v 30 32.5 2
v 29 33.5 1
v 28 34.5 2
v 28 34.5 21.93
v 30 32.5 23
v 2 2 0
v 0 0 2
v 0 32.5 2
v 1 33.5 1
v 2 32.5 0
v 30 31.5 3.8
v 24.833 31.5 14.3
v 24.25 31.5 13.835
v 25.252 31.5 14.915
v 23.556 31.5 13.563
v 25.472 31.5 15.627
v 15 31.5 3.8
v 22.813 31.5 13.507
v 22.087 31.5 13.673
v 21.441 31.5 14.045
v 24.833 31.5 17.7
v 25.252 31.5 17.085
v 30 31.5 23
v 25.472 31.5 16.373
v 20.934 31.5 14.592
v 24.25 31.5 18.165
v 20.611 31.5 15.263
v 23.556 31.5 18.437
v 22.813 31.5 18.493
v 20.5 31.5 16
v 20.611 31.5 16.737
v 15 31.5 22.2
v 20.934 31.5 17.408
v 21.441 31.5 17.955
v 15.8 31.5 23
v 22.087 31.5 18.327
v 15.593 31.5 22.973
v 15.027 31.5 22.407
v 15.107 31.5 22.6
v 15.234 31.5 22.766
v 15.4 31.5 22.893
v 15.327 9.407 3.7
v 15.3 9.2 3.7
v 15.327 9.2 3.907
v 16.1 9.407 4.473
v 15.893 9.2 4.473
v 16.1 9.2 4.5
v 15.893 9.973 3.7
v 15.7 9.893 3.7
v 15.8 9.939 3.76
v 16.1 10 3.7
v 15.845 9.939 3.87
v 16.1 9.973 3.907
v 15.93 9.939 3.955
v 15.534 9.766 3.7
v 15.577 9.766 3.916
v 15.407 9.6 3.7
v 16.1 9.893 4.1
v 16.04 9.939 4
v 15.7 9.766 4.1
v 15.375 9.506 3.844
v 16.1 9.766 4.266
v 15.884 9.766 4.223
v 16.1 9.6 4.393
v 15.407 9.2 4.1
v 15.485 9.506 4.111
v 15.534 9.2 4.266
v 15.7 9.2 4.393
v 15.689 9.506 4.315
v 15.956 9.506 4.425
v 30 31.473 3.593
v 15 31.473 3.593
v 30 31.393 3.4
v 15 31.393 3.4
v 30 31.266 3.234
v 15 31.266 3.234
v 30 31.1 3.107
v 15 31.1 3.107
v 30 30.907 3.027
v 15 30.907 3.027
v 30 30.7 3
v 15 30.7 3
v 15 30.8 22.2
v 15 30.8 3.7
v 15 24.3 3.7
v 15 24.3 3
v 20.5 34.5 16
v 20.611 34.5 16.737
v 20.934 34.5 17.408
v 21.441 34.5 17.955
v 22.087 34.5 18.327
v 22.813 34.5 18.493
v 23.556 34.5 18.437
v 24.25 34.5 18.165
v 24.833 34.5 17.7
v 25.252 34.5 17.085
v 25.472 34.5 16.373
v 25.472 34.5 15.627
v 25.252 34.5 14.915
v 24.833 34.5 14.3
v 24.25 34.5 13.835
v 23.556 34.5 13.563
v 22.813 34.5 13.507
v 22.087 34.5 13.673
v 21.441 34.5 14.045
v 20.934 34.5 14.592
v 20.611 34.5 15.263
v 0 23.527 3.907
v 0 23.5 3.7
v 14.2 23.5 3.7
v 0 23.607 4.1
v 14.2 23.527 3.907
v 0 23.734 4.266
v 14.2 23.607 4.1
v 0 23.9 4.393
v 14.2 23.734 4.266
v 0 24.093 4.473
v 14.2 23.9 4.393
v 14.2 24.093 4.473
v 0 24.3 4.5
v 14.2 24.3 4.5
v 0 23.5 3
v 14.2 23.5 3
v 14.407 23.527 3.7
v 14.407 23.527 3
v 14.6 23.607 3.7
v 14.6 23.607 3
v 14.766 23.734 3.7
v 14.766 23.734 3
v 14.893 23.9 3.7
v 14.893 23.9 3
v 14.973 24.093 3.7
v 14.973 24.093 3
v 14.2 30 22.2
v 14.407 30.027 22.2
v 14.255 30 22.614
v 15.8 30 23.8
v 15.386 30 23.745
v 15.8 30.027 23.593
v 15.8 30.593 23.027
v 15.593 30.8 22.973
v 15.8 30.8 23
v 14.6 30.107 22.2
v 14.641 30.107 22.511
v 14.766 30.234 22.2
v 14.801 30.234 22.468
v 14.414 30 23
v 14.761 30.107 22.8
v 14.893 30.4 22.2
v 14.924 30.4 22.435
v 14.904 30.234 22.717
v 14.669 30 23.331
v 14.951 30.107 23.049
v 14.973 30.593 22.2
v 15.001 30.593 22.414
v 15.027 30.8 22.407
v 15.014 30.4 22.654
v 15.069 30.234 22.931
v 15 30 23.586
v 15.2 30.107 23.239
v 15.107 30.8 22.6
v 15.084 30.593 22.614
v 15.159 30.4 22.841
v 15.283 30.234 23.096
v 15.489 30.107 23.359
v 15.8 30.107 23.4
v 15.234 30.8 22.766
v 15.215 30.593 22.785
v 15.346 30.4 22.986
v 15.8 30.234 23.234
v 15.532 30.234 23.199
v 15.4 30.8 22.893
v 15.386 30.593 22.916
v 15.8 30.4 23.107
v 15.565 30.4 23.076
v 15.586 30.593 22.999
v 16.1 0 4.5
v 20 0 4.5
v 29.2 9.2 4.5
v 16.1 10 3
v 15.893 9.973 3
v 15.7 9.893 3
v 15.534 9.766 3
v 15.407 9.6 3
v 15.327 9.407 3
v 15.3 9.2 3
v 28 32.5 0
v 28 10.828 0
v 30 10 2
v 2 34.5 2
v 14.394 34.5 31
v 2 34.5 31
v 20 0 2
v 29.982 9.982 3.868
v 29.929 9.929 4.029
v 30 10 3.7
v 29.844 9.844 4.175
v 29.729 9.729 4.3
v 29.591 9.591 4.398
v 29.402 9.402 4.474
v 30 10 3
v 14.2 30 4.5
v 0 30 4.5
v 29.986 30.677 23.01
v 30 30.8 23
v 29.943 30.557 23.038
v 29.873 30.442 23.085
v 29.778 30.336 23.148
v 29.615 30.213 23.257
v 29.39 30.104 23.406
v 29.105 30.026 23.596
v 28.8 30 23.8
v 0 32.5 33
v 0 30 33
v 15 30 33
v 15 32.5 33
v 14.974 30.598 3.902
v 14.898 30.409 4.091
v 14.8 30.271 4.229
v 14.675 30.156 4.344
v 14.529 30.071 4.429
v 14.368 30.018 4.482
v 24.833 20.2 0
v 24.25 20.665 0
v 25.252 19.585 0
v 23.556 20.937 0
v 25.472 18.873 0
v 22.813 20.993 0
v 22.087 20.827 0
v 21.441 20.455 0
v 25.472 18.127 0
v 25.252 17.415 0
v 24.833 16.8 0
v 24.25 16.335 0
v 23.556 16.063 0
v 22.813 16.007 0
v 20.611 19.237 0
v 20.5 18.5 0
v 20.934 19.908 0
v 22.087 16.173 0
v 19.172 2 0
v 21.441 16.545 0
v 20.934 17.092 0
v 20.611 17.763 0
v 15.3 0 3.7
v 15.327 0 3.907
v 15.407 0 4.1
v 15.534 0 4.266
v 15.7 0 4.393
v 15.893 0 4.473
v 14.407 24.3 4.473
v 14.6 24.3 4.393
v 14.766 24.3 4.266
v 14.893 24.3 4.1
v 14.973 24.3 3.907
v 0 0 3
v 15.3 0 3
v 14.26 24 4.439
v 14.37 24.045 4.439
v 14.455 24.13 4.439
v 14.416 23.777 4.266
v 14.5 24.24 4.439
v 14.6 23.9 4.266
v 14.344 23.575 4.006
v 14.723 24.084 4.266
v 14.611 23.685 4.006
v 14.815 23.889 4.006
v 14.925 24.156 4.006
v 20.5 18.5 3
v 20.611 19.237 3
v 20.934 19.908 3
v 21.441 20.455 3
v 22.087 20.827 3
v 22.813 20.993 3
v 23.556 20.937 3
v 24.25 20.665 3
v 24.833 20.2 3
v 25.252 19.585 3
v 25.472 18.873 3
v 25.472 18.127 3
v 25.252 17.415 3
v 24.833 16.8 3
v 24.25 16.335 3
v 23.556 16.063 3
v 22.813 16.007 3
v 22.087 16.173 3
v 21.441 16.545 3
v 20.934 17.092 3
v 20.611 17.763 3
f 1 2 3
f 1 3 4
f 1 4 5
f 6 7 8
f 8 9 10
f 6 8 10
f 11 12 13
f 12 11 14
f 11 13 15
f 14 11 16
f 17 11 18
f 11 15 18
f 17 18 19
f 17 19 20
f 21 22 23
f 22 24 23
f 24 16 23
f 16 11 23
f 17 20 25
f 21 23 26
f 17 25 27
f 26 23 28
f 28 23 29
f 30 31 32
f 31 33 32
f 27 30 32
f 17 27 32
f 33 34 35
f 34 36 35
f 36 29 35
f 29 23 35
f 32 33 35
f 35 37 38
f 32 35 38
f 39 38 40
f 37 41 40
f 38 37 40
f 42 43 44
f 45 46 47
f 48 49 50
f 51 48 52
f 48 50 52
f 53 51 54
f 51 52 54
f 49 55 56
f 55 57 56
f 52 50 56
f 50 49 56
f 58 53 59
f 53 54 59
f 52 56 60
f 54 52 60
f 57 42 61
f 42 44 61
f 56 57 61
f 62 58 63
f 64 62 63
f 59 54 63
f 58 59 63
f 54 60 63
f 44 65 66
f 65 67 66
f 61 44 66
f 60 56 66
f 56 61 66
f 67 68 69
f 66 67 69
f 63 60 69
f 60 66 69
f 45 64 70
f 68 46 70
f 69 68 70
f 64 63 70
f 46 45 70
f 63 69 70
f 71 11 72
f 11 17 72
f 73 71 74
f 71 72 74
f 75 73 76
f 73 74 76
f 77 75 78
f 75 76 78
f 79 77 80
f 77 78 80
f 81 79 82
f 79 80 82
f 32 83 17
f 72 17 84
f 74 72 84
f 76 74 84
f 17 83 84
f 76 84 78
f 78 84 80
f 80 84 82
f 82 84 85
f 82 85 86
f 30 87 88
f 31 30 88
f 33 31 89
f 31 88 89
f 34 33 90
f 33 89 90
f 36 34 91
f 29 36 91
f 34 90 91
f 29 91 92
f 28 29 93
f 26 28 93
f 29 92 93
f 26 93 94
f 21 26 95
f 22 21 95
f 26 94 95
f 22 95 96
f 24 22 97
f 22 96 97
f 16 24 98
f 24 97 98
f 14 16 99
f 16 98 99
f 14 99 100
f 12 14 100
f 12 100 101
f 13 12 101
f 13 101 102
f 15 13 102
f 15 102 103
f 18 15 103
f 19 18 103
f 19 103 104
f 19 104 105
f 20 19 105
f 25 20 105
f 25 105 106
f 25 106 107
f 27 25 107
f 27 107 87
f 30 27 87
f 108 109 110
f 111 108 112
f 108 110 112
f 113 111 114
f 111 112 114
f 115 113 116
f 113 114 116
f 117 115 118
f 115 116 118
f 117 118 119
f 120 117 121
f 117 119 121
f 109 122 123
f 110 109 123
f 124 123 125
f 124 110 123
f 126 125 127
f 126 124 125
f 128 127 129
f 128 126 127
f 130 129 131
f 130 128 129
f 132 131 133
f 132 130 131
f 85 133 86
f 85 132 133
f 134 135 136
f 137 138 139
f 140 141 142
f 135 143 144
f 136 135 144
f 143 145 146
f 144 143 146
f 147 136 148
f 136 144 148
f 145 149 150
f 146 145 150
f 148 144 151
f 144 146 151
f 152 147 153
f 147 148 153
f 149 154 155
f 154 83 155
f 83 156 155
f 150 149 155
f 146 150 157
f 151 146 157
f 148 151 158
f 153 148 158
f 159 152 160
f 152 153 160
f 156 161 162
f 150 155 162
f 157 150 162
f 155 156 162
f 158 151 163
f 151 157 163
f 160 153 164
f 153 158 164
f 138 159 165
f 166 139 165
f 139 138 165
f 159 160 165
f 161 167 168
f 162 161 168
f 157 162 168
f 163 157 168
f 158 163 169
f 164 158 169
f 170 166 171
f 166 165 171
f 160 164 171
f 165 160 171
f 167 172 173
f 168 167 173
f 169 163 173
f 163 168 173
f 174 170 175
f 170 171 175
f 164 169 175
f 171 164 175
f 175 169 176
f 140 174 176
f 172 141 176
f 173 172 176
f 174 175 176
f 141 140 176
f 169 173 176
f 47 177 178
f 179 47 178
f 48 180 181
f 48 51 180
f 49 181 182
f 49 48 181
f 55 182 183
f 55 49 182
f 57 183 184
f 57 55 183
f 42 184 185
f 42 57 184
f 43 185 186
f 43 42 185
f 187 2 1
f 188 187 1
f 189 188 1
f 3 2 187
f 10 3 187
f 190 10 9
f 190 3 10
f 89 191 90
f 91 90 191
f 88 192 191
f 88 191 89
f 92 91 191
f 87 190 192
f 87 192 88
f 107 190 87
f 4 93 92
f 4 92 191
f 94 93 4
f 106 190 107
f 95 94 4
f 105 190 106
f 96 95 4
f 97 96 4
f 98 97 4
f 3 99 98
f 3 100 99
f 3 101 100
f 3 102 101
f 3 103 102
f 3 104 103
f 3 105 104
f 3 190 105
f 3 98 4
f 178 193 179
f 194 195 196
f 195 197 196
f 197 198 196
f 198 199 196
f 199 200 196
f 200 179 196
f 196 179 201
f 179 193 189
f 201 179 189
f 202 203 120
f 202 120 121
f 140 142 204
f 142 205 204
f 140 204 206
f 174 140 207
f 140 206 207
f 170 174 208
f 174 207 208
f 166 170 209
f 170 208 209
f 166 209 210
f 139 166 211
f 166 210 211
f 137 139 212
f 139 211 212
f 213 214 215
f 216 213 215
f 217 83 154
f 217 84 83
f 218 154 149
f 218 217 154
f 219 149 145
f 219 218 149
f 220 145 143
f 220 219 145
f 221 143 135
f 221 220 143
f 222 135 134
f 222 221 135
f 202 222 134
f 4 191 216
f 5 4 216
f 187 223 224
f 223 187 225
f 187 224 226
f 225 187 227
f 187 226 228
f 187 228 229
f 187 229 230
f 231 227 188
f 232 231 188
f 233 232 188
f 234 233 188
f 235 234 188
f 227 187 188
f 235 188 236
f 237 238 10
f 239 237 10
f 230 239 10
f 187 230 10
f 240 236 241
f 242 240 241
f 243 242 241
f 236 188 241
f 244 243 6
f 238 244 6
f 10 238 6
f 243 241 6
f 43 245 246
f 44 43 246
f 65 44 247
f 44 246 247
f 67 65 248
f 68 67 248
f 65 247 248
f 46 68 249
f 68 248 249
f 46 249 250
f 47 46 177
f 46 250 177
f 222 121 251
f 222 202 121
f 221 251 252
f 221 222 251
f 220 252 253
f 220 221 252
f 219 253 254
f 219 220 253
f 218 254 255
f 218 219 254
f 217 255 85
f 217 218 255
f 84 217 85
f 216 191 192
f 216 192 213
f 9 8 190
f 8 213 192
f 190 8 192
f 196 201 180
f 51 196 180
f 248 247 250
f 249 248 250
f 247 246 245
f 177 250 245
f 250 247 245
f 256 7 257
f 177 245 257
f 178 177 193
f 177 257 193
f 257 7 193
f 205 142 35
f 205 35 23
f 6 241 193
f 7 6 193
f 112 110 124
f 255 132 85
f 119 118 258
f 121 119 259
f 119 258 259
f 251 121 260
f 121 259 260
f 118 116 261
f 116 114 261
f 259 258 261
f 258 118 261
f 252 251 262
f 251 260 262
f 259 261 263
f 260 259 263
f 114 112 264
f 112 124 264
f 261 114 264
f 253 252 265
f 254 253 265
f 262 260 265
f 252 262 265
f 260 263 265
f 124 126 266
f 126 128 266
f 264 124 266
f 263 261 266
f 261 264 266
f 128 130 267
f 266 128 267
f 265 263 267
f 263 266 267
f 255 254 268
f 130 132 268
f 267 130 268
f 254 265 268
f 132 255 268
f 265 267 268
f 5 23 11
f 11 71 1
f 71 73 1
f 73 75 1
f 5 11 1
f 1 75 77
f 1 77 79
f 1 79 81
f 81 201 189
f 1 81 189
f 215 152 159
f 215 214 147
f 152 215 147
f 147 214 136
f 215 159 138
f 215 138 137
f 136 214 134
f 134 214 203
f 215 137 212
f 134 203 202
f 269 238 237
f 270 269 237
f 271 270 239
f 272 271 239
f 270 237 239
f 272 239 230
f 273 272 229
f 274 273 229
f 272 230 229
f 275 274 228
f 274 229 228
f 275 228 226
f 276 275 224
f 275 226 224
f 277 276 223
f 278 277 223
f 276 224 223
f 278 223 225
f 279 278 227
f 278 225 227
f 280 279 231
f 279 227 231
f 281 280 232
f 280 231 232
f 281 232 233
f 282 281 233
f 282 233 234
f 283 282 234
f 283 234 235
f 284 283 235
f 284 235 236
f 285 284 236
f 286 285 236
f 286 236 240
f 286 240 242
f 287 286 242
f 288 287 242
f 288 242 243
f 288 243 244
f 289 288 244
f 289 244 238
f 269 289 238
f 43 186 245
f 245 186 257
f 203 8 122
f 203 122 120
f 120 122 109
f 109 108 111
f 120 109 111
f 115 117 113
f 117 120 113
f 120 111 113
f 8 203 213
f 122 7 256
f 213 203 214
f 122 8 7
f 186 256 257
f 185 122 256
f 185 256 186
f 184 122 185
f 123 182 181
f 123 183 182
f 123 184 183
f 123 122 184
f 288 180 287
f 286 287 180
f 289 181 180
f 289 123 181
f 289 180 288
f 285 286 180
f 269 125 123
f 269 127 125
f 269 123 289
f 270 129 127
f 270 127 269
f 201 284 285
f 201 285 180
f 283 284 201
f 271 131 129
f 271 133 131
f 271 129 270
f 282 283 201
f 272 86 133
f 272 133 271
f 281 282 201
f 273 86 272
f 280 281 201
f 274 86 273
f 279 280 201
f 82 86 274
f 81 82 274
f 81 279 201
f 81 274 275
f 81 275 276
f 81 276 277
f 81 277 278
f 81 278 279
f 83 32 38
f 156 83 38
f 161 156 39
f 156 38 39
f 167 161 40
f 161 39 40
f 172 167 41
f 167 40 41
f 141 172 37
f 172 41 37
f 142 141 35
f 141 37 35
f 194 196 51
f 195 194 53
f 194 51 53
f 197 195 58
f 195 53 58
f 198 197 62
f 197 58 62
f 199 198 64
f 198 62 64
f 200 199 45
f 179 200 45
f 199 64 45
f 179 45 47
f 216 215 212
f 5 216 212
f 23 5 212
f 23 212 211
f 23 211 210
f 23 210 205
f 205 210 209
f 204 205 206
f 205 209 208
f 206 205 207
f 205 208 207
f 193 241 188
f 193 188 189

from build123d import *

# Parameters (mm, degrees)
BOSS_EXTRUDE1_DEPTH = 3
SKETCH2_W           = 15
SKETCH2_H           = 6.5
BOSS_EXTRUDE2_DEPTH = 1.5
BOSS_EXTRUDE3_DEPTH = 4.5
CUT_EXTRUDE1_DEPTH  = 1.5
FILLET1_R           = 0.8
CHAMFER1_SIZE       = 2
CHAMFER2_SIZE       = 2
FILLET2_R           = 0.8
SKETCH5_R           = 2.5
CUT_EXTRUDE2_DEPTH  = 57.384838388
SKETCH6_R           = 2.5
CUT_EXTRUDE3_DEPTH  = 57.384838388


with BuildPart() as part:
    # Sketch1 → Boss-Extrude1 (new body)
    with BuildSketch(Plane.XY):
        Polygon((0, 0), (20, 0), (30, 10), (30, 30), (0, 30), align=None)
    extrude(amount=BOSS_EXTRUDE1_DEPTH)

    # Sketch2 → Boss-Extrude2 (add)
    with BuildSketch(Plane.XY.offset(3)):
        Polygon((30, 10), (15.3, 10), (15.3, 0), (20, 0), align=None)
        with Locations((7.5, 26.75)):
            Rectangle(SKETCH2_W, SKETCH2_H)
    extrude(amount=BOSS_EXTRUDE2_DEPTH)

    # Sketch3 → Boss-Extrude3 (add)
    with BuildSketch(Plane(origin=(0, 30, 0), x_dir=(1, 0, 0), z_dir=(0, 1, 0))):
        Polygon((0, -3), (0, -33), (15, -33), (30, -23), (30, -3), (30, 0), (0, 0), align=None)
    extrude(amount=BOSS_EXTRUDE3_DEPTH)

    # Sketch4 → Cut-Extrude1 (cut)
    with BuildSketch(Plane.XZ.offset(-30)):
        Polygon((15, 23), (30, 23), (30, 3), (15, 3), (15, 4.5), align=None)
    extrude(amount=-CUT_EXTRUDE1_DEPTH, mode=Mode.SUBTRACT)

    # Fillet1
    fillet1_edges = [part.edges().sort_by_distance(p)[0] for p in [
        (15, 23.5, 3.75),
        (7.5, 23.5, 4.5),
        (15, 26.75, 4.5),
        (15.3, 5, 4.5),
        (15.3, 10, 3.75),
        (22.65, 10, 4.5),
        (15, 30, 13.75),
        (22.5, 30, 23),
        (15, 30.75, 23),
    ]]
    fillet(fillet1_edges, radius=FILLET1_R)

    # Chamfer1
    chamfer1_edges = [part.edges().sort_by_distance(p)[0] for p in [
        (15, 34.5, 0),
    ]]
    chamfer(chamfer1_edges, length=CHAMFER1_SIZE)

    # Chamfer2
    # the kernel refuses this chamfer: 2 mm, written as the material it takes off along each edge
    with BuildSketch(Plane(origin=(30, 37.643365976, 0), x_dir=(-0.9996219169112968, 0, -0.02749587661058639), z_dir=(0, -1, 0))) as chamfer2_piece_1:
        Polygon((CHAMFER2_SIZE * 0.999621916911, -CHAMFER2_SIZE * 0.0274958766106), (-CHAMFER2_SIZE * 0.0274958766106, -CHAMFER2_SIZE * 0.999621916911), (0, 0), align=None)
    extrude(amount=32.786731952, mode=Mode.SUBTRACT)
    with BuildSketch(Plane(origin=(16.36309104, -3.63690896, 0), x_dir=(-0.7068394360706732, 0.7068394360706737, -0.027495876610586376), z_dir=(0.7071067811865478, 0.7071067811865474, 0))) as chamfer2_piece_2:
        Polygon((CHAMFER2_SIZE * 0.999621916911, CHAMFER2_SIZE * 0.0274958766106), (-CHAMFER2_SIZE * 0.0274958766106, CHAMFER2_SIZE * 0.999621916911), (0, 0), align=None)
    extrude(amount=24.428867576, mode=Mode.SUBTRACT)
    with BuildSketch(Plane(origin=(-5.143365976, 0, 0), x_dir=(0, 0.9996219169112968, -0.027495876610586372), z_dir=(1, 0, 0))) as chamfer2_piece_3:
        Polygon((CHAMFER2_SIZE * 0.999621916911, CHAMFER2_SIZE * 0.0274958766106), (-CHAMFER2_SIZE * 0.0274958766106, CHAMFER2_SIZE * 0.999621916911), (0, 0), align=None)
    extrude(amount=30.286731952, mode=Mode.SUBTRACT)
    with BuildSketch(Plane(origin=(0, 37.643365976, 0), x_dir=(-0.027495876610586372, 0, 0.9996219169112968), z_dir=(0, -1, 0))) as chamfer2_piece_4:
        Polygon((CHAMFER2_SIZE * 0.999621916911, -CHAMFER2_SIZE * 0.0274958766106), (-CHAMFER2_SIZE * 0.0274958766106, -CHAMFER2_SIZE * 0.999621916911), (0, 0), align=None)
    extrude(amount=42.786731952, mode=Mode.SUBTRACT)
    with BuildSketch(Plane(origin=(0, 34.5, 38.143365976), x_dir=(-0.0274958766105864, -0.9996219169112968, 0), z_dir=(0, 0, -1))) as chamfer2_piece_5:
        Polygon((CHAMFER2_SIZE * 0.999621916911, -CHAMFER2_SIZE * 0.0274958766106), (-CHAMFER2_SIZE * 0.0274958766106, -CHAMFER2_SIZE * 0.999621916911), (0, 0), align=None)
    extrude(amount=41.286731952, mode=Mode.SUBTRACT)
    with BuildSketch(Plane(origin=(30, 34.5, -3.143365976), x_dir=(-0.9996219169112968, 0.027495876610585647, 0), z_dir=(0, 0, 1))) as chamfer2_piece_6:
        Polygon((CHAMFER2_SIZE * 0.999621916911, CHAMFER2_SIZE * 0.0274958766106), (-CHAMFER2_SIZE * 0.0274958766106, CHAMFER2_SIZE * 0.999621916911), (0, 0), align=None)
    extrude(amount=31.286731952, mode=Mode.SUBTRACT)
    with BuildSketch(Plane(origin=(10.720460826, 34.5, 35.853026116), x_dir=(-0.5544904734617357, 0.027495876610585605, -0.8317357101926042), z_dir=(0.8320502943378439, 0, -0.5547001962252288))) as chamfer2_piece_7:
        Polygon((CHAMFER2_SIZE * 0.999621916911, -CHAMFER2_SIZE * 0.0274958766106), (-CHAMFER2_SIZE * 0.0274958766106, -CHAMFER2_SIZE * 0.999621916911), (0, 0), align=None)
    extrude(amount=28.314488329, mode=Mode.SUBTRACT)
    with BuildSketch(Plane(origin=(-5.143365976, 34.5, 33), x_dir=(0, 0.027495876610585647, -0.9996219169112968), z_dir=(1, 0, 0))) as chamfer2_piece_8:
        Polygon((CHAMFER2_SIZE * 0.999621916911, -CHAMFER2_SIZE * 0.0274958766106), (-CHAMFER2_SIZE * 0.0274958766106, -CHAMFER2_SIZE * 0.999621916911), (0, 0), align=None)
    extrude(amount=25.286731952, mode=Mode.SUBTRACT)

    # Fillet2
    fillet2_edges = [part.edges().sort_by_distance(p)[0] for p in [
        (22.5, 31.5, 3),
    ]]
    fillet(fillet2_edges, radius=FILLET2_R)

    # Sketch5 → Cut-Extrude2 (cut, through all)
    with BuildSketch(Plane(origin=(0, 0, 0), x_dir=(-1, 0, 0), z_dir=(0, 0, -1))):
        with Locations((-23, 18.5)):
            Circle(SKETCH5_R)
    extrude(amount=-CUT_EXTRUDE2_DEPTH, mode=Mode.SUBTRACT)

    # Sketch6 → Cut-Extrude3 (cut, through all)
    with BuildSketch(Plane(origin=(0, 34.5, 0), x_dir=(1, 0, 0), z_dir=(0, 1, 0))):
        with Locations(Location((23, -16, 0), (0, 0, 180))):
            Circle(SKETCH6_R)
    extrude(amount=-CUT_EXTRUDE3_DEPTH, mode=Mode.SUBTRACT)


solid = part.part
